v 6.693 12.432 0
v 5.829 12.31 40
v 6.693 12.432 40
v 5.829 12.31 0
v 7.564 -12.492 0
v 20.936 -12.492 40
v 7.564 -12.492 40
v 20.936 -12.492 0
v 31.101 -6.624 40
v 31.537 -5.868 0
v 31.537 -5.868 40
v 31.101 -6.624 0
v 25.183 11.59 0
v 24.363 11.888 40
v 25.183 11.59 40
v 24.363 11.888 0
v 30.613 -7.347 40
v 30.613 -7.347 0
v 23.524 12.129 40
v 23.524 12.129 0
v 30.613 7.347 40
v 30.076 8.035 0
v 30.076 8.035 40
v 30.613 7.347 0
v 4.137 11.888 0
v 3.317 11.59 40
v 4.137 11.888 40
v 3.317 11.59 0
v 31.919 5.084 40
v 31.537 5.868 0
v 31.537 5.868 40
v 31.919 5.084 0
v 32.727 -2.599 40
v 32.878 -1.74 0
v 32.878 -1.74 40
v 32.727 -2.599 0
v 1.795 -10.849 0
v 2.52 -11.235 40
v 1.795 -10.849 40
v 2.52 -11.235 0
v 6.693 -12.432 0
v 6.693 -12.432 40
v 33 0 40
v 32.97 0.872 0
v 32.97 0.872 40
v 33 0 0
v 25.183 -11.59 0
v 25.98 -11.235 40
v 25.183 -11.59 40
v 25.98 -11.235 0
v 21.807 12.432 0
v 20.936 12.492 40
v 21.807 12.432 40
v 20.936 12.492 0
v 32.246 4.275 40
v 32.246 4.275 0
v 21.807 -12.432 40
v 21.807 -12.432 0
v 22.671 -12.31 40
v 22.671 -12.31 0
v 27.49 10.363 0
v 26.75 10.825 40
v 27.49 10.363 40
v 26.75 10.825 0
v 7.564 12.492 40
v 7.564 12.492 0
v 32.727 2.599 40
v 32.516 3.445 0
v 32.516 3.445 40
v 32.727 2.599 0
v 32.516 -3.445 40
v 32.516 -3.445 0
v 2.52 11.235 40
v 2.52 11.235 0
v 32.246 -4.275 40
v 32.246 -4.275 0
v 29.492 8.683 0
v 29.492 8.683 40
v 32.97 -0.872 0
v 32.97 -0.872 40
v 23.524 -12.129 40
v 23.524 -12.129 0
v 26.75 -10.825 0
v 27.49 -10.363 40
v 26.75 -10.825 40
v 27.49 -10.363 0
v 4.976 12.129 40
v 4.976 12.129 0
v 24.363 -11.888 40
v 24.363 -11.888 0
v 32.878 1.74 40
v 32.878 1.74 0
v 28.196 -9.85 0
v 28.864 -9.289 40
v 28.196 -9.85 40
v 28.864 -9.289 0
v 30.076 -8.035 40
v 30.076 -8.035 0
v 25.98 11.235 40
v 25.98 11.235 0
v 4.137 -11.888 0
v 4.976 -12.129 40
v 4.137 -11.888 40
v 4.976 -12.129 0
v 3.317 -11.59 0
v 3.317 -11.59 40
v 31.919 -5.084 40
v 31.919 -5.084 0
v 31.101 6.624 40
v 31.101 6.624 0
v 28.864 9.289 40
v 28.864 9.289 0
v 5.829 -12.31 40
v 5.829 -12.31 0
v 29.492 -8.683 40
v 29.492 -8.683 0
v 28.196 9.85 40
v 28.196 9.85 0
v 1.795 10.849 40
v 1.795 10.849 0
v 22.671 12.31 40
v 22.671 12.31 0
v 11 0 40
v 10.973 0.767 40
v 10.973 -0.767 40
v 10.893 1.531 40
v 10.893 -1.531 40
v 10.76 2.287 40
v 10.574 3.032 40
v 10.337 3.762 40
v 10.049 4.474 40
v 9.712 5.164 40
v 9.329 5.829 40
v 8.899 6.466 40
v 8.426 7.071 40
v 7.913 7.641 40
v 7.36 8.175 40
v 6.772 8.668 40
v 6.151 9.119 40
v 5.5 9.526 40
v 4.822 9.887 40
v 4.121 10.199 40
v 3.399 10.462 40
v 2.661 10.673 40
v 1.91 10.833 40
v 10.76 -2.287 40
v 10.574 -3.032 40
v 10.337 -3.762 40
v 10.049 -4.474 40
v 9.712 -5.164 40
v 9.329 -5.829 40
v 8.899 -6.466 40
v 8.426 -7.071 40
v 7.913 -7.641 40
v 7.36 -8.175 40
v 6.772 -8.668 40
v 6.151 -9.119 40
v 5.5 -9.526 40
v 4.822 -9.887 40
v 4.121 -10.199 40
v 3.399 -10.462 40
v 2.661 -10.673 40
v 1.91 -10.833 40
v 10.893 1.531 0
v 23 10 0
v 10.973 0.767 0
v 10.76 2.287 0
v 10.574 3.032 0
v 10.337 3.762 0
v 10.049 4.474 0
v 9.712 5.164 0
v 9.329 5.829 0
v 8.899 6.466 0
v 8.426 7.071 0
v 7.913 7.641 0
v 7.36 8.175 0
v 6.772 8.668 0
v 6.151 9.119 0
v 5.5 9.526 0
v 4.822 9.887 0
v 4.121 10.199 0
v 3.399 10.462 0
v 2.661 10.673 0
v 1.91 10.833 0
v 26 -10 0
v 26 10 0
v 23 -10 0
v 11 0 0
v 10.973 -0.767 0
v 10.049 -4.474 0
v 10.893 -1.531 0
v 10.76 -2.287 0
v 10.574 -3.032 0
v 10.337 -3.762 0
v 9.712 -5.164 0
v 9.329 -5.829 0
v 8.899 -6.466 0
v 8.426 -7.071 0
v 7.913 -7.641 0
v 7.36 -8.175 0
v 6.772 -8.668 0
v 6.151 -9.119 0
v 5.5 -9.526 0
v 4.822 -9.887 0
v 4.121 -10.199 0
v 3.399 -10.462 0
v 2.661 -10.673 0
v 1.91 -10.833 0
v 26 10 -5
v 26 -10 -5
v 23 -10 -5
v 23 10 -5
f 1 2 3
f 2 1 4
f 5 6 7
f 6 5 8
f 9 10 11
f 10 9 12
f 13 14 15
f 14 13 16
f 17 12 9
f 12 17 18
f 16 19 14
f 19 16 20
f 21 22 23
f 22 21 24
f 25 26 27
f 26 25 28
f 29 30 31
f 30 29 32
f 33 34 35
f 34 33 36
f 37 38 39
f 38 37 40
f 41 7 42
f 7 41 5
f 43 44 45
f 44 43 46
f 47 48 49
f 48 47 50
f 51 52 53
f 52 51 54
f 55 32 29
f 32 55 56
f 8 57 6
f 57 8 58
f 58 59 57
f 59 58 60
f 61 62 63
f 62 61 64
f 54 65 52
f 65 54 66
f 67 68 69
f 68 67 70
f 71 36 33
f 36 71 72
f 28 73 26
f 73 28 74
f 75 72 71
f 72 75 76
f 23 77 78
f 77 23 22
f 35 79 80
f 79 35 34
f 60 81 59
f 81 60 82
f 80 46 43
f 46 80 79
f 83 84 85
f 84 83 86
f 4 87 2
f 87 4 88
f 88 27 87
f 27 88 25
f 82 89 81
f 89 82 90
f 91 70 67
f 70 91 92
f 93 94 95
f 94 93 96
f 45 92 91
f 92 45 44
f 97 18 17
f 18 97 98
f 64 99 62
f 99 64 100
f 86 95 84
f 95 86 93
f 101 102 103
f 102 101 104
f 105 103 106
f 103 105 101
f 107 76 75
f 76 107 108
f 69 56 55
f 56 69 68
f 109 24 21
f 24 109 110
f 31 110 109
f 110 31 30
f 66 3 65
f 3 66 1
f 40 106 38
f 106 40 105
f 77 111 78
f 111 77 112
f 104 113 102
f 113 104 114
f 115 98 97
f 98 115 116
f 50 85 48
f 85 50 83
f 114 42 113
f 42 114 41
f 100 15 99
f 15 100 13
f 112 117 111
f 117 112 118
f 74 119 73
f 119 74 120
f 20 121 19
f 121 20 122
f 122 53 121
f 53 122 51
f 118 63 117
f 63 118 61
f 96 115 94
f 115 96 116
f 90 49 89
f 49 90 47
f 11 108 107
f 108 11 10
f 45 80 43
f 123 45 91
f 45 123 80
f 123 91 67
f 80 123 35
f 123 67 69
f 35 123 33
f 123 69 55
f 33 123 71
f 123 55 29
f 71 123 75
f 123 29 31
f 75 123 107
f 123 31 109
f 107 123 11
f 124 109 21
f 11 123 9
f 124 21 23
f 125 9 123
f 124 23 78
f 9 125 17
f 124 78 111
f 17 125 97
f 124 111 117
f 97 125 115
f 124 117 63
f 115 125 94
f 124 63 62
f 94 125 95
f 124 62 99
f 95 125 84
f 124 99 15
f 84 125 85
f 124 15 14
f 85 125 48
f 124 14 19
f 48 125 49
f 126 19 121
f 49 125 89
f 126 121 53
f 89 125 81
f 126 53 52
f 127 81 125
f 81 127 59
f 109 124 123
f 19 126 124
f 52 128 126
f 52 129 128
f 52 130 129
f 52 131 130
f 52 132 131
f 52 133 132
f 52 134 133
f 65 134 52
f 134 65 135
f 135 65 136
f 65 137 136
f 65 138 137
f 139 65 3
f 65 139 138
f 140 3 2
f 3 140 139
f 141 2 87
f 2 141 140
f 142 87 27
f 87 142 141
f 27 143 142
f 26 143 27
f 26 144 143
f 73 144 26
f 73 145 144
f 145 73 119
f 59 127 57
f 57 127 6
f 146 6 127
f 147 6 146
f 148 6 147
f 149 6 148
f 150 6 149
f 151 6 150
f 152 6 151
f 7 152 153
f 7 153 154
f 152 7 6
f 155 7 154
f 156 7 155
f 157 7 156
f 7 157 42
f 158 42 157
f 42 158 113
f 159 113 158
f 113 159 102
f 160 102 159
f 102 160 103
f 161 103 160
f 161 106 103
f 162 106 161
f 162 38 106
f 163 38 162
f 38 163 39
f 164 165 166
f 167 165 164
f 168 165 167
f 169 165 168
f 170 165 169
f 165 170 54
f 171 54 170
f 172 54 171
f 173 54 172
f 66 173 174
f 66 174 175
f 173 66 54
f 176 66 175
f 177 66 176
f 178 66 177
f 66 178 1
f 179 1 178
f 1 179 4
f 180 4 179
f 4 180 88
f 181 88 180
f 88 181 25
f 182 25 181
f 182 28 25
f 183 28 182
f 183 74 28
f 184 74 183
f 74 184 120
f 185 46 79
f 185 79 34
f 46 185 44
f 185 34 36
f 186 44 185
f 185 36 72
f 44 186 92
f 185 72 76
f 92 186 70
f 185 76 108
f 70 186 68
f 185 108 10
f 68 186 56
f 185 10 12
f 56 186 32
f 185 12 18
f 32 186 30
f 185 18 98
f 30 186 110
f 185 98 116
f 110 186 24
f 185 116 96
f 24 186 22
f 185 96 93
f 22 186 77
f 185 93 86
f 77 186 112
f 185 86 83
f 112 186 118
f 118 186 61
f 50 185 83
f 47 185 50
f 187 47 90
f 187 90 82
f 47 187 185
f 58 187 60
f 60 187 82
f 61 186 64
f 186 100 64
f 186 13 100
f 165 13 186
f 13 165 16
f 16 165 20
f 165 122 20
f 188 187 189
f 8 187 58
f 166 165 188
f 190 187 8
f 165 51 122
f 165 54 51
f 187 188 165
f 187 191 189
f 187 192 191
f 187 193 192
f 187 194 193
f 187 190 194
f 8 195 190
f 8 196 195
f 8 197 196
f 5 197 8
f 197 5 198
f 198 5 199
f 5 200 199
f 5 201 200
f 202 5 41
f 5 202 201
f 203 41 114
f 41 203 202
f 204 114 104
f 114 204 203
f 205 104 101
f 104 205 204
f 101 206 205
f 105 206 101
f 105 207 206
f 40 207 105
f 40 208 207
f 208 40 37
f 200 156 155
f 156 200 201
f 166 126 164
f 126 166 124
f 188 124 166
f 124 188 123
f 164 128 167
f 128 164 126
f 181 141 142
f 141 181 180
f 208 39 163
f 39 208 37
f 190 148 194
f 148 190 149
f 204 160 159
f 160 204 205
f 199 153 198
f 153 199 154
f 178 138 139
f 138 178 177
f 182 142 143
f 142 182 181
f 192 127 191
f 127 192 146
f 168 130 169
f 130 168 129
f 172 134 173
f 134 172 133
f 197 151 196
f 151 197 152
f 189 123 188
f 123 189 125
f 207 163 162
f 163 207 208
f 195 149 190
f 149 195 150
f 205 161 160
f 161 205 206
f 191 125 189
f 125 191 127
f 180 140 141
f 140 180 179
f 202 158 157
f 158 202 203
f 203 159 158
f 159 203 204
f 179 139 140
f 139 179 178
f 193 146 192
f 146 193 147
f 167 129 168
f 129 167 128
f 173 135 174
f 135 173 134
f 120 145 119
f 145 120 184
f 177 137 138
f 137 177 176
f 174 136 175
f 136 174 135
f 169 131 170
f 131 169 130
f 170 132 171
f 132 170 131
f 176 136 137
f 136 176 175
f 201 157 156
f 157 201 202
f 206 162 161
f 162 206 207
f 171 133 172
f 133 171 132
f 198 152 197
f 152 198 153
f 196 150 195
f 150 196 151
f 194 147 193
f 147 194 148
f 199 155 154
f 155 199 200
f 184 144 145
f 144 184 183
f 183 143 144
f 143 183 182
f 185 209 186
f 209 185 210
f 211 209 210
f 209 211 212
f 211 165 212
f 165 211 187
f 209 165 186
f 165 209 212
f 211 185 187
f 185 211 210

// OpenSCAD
// Xiaomi telefono laikiklis
$fn=90;
h1=12;
h2=10;
d1=22;
d2=25;
w = 40;

difference() {
    hull() {
        translate([h1+h2-d2/2+d1/2,0,0]) cylinder(d=d2, h=w);
        translate([8,0,0]) cylinder(d=d2, h=w);
    }
    cylinder(d=d1, h=w);
}

cx=3;
cy=20;
cz=5;

translate([h1+d1/2,-1*cy/2,-1*cz]) cube([cx,cy,cz]);
